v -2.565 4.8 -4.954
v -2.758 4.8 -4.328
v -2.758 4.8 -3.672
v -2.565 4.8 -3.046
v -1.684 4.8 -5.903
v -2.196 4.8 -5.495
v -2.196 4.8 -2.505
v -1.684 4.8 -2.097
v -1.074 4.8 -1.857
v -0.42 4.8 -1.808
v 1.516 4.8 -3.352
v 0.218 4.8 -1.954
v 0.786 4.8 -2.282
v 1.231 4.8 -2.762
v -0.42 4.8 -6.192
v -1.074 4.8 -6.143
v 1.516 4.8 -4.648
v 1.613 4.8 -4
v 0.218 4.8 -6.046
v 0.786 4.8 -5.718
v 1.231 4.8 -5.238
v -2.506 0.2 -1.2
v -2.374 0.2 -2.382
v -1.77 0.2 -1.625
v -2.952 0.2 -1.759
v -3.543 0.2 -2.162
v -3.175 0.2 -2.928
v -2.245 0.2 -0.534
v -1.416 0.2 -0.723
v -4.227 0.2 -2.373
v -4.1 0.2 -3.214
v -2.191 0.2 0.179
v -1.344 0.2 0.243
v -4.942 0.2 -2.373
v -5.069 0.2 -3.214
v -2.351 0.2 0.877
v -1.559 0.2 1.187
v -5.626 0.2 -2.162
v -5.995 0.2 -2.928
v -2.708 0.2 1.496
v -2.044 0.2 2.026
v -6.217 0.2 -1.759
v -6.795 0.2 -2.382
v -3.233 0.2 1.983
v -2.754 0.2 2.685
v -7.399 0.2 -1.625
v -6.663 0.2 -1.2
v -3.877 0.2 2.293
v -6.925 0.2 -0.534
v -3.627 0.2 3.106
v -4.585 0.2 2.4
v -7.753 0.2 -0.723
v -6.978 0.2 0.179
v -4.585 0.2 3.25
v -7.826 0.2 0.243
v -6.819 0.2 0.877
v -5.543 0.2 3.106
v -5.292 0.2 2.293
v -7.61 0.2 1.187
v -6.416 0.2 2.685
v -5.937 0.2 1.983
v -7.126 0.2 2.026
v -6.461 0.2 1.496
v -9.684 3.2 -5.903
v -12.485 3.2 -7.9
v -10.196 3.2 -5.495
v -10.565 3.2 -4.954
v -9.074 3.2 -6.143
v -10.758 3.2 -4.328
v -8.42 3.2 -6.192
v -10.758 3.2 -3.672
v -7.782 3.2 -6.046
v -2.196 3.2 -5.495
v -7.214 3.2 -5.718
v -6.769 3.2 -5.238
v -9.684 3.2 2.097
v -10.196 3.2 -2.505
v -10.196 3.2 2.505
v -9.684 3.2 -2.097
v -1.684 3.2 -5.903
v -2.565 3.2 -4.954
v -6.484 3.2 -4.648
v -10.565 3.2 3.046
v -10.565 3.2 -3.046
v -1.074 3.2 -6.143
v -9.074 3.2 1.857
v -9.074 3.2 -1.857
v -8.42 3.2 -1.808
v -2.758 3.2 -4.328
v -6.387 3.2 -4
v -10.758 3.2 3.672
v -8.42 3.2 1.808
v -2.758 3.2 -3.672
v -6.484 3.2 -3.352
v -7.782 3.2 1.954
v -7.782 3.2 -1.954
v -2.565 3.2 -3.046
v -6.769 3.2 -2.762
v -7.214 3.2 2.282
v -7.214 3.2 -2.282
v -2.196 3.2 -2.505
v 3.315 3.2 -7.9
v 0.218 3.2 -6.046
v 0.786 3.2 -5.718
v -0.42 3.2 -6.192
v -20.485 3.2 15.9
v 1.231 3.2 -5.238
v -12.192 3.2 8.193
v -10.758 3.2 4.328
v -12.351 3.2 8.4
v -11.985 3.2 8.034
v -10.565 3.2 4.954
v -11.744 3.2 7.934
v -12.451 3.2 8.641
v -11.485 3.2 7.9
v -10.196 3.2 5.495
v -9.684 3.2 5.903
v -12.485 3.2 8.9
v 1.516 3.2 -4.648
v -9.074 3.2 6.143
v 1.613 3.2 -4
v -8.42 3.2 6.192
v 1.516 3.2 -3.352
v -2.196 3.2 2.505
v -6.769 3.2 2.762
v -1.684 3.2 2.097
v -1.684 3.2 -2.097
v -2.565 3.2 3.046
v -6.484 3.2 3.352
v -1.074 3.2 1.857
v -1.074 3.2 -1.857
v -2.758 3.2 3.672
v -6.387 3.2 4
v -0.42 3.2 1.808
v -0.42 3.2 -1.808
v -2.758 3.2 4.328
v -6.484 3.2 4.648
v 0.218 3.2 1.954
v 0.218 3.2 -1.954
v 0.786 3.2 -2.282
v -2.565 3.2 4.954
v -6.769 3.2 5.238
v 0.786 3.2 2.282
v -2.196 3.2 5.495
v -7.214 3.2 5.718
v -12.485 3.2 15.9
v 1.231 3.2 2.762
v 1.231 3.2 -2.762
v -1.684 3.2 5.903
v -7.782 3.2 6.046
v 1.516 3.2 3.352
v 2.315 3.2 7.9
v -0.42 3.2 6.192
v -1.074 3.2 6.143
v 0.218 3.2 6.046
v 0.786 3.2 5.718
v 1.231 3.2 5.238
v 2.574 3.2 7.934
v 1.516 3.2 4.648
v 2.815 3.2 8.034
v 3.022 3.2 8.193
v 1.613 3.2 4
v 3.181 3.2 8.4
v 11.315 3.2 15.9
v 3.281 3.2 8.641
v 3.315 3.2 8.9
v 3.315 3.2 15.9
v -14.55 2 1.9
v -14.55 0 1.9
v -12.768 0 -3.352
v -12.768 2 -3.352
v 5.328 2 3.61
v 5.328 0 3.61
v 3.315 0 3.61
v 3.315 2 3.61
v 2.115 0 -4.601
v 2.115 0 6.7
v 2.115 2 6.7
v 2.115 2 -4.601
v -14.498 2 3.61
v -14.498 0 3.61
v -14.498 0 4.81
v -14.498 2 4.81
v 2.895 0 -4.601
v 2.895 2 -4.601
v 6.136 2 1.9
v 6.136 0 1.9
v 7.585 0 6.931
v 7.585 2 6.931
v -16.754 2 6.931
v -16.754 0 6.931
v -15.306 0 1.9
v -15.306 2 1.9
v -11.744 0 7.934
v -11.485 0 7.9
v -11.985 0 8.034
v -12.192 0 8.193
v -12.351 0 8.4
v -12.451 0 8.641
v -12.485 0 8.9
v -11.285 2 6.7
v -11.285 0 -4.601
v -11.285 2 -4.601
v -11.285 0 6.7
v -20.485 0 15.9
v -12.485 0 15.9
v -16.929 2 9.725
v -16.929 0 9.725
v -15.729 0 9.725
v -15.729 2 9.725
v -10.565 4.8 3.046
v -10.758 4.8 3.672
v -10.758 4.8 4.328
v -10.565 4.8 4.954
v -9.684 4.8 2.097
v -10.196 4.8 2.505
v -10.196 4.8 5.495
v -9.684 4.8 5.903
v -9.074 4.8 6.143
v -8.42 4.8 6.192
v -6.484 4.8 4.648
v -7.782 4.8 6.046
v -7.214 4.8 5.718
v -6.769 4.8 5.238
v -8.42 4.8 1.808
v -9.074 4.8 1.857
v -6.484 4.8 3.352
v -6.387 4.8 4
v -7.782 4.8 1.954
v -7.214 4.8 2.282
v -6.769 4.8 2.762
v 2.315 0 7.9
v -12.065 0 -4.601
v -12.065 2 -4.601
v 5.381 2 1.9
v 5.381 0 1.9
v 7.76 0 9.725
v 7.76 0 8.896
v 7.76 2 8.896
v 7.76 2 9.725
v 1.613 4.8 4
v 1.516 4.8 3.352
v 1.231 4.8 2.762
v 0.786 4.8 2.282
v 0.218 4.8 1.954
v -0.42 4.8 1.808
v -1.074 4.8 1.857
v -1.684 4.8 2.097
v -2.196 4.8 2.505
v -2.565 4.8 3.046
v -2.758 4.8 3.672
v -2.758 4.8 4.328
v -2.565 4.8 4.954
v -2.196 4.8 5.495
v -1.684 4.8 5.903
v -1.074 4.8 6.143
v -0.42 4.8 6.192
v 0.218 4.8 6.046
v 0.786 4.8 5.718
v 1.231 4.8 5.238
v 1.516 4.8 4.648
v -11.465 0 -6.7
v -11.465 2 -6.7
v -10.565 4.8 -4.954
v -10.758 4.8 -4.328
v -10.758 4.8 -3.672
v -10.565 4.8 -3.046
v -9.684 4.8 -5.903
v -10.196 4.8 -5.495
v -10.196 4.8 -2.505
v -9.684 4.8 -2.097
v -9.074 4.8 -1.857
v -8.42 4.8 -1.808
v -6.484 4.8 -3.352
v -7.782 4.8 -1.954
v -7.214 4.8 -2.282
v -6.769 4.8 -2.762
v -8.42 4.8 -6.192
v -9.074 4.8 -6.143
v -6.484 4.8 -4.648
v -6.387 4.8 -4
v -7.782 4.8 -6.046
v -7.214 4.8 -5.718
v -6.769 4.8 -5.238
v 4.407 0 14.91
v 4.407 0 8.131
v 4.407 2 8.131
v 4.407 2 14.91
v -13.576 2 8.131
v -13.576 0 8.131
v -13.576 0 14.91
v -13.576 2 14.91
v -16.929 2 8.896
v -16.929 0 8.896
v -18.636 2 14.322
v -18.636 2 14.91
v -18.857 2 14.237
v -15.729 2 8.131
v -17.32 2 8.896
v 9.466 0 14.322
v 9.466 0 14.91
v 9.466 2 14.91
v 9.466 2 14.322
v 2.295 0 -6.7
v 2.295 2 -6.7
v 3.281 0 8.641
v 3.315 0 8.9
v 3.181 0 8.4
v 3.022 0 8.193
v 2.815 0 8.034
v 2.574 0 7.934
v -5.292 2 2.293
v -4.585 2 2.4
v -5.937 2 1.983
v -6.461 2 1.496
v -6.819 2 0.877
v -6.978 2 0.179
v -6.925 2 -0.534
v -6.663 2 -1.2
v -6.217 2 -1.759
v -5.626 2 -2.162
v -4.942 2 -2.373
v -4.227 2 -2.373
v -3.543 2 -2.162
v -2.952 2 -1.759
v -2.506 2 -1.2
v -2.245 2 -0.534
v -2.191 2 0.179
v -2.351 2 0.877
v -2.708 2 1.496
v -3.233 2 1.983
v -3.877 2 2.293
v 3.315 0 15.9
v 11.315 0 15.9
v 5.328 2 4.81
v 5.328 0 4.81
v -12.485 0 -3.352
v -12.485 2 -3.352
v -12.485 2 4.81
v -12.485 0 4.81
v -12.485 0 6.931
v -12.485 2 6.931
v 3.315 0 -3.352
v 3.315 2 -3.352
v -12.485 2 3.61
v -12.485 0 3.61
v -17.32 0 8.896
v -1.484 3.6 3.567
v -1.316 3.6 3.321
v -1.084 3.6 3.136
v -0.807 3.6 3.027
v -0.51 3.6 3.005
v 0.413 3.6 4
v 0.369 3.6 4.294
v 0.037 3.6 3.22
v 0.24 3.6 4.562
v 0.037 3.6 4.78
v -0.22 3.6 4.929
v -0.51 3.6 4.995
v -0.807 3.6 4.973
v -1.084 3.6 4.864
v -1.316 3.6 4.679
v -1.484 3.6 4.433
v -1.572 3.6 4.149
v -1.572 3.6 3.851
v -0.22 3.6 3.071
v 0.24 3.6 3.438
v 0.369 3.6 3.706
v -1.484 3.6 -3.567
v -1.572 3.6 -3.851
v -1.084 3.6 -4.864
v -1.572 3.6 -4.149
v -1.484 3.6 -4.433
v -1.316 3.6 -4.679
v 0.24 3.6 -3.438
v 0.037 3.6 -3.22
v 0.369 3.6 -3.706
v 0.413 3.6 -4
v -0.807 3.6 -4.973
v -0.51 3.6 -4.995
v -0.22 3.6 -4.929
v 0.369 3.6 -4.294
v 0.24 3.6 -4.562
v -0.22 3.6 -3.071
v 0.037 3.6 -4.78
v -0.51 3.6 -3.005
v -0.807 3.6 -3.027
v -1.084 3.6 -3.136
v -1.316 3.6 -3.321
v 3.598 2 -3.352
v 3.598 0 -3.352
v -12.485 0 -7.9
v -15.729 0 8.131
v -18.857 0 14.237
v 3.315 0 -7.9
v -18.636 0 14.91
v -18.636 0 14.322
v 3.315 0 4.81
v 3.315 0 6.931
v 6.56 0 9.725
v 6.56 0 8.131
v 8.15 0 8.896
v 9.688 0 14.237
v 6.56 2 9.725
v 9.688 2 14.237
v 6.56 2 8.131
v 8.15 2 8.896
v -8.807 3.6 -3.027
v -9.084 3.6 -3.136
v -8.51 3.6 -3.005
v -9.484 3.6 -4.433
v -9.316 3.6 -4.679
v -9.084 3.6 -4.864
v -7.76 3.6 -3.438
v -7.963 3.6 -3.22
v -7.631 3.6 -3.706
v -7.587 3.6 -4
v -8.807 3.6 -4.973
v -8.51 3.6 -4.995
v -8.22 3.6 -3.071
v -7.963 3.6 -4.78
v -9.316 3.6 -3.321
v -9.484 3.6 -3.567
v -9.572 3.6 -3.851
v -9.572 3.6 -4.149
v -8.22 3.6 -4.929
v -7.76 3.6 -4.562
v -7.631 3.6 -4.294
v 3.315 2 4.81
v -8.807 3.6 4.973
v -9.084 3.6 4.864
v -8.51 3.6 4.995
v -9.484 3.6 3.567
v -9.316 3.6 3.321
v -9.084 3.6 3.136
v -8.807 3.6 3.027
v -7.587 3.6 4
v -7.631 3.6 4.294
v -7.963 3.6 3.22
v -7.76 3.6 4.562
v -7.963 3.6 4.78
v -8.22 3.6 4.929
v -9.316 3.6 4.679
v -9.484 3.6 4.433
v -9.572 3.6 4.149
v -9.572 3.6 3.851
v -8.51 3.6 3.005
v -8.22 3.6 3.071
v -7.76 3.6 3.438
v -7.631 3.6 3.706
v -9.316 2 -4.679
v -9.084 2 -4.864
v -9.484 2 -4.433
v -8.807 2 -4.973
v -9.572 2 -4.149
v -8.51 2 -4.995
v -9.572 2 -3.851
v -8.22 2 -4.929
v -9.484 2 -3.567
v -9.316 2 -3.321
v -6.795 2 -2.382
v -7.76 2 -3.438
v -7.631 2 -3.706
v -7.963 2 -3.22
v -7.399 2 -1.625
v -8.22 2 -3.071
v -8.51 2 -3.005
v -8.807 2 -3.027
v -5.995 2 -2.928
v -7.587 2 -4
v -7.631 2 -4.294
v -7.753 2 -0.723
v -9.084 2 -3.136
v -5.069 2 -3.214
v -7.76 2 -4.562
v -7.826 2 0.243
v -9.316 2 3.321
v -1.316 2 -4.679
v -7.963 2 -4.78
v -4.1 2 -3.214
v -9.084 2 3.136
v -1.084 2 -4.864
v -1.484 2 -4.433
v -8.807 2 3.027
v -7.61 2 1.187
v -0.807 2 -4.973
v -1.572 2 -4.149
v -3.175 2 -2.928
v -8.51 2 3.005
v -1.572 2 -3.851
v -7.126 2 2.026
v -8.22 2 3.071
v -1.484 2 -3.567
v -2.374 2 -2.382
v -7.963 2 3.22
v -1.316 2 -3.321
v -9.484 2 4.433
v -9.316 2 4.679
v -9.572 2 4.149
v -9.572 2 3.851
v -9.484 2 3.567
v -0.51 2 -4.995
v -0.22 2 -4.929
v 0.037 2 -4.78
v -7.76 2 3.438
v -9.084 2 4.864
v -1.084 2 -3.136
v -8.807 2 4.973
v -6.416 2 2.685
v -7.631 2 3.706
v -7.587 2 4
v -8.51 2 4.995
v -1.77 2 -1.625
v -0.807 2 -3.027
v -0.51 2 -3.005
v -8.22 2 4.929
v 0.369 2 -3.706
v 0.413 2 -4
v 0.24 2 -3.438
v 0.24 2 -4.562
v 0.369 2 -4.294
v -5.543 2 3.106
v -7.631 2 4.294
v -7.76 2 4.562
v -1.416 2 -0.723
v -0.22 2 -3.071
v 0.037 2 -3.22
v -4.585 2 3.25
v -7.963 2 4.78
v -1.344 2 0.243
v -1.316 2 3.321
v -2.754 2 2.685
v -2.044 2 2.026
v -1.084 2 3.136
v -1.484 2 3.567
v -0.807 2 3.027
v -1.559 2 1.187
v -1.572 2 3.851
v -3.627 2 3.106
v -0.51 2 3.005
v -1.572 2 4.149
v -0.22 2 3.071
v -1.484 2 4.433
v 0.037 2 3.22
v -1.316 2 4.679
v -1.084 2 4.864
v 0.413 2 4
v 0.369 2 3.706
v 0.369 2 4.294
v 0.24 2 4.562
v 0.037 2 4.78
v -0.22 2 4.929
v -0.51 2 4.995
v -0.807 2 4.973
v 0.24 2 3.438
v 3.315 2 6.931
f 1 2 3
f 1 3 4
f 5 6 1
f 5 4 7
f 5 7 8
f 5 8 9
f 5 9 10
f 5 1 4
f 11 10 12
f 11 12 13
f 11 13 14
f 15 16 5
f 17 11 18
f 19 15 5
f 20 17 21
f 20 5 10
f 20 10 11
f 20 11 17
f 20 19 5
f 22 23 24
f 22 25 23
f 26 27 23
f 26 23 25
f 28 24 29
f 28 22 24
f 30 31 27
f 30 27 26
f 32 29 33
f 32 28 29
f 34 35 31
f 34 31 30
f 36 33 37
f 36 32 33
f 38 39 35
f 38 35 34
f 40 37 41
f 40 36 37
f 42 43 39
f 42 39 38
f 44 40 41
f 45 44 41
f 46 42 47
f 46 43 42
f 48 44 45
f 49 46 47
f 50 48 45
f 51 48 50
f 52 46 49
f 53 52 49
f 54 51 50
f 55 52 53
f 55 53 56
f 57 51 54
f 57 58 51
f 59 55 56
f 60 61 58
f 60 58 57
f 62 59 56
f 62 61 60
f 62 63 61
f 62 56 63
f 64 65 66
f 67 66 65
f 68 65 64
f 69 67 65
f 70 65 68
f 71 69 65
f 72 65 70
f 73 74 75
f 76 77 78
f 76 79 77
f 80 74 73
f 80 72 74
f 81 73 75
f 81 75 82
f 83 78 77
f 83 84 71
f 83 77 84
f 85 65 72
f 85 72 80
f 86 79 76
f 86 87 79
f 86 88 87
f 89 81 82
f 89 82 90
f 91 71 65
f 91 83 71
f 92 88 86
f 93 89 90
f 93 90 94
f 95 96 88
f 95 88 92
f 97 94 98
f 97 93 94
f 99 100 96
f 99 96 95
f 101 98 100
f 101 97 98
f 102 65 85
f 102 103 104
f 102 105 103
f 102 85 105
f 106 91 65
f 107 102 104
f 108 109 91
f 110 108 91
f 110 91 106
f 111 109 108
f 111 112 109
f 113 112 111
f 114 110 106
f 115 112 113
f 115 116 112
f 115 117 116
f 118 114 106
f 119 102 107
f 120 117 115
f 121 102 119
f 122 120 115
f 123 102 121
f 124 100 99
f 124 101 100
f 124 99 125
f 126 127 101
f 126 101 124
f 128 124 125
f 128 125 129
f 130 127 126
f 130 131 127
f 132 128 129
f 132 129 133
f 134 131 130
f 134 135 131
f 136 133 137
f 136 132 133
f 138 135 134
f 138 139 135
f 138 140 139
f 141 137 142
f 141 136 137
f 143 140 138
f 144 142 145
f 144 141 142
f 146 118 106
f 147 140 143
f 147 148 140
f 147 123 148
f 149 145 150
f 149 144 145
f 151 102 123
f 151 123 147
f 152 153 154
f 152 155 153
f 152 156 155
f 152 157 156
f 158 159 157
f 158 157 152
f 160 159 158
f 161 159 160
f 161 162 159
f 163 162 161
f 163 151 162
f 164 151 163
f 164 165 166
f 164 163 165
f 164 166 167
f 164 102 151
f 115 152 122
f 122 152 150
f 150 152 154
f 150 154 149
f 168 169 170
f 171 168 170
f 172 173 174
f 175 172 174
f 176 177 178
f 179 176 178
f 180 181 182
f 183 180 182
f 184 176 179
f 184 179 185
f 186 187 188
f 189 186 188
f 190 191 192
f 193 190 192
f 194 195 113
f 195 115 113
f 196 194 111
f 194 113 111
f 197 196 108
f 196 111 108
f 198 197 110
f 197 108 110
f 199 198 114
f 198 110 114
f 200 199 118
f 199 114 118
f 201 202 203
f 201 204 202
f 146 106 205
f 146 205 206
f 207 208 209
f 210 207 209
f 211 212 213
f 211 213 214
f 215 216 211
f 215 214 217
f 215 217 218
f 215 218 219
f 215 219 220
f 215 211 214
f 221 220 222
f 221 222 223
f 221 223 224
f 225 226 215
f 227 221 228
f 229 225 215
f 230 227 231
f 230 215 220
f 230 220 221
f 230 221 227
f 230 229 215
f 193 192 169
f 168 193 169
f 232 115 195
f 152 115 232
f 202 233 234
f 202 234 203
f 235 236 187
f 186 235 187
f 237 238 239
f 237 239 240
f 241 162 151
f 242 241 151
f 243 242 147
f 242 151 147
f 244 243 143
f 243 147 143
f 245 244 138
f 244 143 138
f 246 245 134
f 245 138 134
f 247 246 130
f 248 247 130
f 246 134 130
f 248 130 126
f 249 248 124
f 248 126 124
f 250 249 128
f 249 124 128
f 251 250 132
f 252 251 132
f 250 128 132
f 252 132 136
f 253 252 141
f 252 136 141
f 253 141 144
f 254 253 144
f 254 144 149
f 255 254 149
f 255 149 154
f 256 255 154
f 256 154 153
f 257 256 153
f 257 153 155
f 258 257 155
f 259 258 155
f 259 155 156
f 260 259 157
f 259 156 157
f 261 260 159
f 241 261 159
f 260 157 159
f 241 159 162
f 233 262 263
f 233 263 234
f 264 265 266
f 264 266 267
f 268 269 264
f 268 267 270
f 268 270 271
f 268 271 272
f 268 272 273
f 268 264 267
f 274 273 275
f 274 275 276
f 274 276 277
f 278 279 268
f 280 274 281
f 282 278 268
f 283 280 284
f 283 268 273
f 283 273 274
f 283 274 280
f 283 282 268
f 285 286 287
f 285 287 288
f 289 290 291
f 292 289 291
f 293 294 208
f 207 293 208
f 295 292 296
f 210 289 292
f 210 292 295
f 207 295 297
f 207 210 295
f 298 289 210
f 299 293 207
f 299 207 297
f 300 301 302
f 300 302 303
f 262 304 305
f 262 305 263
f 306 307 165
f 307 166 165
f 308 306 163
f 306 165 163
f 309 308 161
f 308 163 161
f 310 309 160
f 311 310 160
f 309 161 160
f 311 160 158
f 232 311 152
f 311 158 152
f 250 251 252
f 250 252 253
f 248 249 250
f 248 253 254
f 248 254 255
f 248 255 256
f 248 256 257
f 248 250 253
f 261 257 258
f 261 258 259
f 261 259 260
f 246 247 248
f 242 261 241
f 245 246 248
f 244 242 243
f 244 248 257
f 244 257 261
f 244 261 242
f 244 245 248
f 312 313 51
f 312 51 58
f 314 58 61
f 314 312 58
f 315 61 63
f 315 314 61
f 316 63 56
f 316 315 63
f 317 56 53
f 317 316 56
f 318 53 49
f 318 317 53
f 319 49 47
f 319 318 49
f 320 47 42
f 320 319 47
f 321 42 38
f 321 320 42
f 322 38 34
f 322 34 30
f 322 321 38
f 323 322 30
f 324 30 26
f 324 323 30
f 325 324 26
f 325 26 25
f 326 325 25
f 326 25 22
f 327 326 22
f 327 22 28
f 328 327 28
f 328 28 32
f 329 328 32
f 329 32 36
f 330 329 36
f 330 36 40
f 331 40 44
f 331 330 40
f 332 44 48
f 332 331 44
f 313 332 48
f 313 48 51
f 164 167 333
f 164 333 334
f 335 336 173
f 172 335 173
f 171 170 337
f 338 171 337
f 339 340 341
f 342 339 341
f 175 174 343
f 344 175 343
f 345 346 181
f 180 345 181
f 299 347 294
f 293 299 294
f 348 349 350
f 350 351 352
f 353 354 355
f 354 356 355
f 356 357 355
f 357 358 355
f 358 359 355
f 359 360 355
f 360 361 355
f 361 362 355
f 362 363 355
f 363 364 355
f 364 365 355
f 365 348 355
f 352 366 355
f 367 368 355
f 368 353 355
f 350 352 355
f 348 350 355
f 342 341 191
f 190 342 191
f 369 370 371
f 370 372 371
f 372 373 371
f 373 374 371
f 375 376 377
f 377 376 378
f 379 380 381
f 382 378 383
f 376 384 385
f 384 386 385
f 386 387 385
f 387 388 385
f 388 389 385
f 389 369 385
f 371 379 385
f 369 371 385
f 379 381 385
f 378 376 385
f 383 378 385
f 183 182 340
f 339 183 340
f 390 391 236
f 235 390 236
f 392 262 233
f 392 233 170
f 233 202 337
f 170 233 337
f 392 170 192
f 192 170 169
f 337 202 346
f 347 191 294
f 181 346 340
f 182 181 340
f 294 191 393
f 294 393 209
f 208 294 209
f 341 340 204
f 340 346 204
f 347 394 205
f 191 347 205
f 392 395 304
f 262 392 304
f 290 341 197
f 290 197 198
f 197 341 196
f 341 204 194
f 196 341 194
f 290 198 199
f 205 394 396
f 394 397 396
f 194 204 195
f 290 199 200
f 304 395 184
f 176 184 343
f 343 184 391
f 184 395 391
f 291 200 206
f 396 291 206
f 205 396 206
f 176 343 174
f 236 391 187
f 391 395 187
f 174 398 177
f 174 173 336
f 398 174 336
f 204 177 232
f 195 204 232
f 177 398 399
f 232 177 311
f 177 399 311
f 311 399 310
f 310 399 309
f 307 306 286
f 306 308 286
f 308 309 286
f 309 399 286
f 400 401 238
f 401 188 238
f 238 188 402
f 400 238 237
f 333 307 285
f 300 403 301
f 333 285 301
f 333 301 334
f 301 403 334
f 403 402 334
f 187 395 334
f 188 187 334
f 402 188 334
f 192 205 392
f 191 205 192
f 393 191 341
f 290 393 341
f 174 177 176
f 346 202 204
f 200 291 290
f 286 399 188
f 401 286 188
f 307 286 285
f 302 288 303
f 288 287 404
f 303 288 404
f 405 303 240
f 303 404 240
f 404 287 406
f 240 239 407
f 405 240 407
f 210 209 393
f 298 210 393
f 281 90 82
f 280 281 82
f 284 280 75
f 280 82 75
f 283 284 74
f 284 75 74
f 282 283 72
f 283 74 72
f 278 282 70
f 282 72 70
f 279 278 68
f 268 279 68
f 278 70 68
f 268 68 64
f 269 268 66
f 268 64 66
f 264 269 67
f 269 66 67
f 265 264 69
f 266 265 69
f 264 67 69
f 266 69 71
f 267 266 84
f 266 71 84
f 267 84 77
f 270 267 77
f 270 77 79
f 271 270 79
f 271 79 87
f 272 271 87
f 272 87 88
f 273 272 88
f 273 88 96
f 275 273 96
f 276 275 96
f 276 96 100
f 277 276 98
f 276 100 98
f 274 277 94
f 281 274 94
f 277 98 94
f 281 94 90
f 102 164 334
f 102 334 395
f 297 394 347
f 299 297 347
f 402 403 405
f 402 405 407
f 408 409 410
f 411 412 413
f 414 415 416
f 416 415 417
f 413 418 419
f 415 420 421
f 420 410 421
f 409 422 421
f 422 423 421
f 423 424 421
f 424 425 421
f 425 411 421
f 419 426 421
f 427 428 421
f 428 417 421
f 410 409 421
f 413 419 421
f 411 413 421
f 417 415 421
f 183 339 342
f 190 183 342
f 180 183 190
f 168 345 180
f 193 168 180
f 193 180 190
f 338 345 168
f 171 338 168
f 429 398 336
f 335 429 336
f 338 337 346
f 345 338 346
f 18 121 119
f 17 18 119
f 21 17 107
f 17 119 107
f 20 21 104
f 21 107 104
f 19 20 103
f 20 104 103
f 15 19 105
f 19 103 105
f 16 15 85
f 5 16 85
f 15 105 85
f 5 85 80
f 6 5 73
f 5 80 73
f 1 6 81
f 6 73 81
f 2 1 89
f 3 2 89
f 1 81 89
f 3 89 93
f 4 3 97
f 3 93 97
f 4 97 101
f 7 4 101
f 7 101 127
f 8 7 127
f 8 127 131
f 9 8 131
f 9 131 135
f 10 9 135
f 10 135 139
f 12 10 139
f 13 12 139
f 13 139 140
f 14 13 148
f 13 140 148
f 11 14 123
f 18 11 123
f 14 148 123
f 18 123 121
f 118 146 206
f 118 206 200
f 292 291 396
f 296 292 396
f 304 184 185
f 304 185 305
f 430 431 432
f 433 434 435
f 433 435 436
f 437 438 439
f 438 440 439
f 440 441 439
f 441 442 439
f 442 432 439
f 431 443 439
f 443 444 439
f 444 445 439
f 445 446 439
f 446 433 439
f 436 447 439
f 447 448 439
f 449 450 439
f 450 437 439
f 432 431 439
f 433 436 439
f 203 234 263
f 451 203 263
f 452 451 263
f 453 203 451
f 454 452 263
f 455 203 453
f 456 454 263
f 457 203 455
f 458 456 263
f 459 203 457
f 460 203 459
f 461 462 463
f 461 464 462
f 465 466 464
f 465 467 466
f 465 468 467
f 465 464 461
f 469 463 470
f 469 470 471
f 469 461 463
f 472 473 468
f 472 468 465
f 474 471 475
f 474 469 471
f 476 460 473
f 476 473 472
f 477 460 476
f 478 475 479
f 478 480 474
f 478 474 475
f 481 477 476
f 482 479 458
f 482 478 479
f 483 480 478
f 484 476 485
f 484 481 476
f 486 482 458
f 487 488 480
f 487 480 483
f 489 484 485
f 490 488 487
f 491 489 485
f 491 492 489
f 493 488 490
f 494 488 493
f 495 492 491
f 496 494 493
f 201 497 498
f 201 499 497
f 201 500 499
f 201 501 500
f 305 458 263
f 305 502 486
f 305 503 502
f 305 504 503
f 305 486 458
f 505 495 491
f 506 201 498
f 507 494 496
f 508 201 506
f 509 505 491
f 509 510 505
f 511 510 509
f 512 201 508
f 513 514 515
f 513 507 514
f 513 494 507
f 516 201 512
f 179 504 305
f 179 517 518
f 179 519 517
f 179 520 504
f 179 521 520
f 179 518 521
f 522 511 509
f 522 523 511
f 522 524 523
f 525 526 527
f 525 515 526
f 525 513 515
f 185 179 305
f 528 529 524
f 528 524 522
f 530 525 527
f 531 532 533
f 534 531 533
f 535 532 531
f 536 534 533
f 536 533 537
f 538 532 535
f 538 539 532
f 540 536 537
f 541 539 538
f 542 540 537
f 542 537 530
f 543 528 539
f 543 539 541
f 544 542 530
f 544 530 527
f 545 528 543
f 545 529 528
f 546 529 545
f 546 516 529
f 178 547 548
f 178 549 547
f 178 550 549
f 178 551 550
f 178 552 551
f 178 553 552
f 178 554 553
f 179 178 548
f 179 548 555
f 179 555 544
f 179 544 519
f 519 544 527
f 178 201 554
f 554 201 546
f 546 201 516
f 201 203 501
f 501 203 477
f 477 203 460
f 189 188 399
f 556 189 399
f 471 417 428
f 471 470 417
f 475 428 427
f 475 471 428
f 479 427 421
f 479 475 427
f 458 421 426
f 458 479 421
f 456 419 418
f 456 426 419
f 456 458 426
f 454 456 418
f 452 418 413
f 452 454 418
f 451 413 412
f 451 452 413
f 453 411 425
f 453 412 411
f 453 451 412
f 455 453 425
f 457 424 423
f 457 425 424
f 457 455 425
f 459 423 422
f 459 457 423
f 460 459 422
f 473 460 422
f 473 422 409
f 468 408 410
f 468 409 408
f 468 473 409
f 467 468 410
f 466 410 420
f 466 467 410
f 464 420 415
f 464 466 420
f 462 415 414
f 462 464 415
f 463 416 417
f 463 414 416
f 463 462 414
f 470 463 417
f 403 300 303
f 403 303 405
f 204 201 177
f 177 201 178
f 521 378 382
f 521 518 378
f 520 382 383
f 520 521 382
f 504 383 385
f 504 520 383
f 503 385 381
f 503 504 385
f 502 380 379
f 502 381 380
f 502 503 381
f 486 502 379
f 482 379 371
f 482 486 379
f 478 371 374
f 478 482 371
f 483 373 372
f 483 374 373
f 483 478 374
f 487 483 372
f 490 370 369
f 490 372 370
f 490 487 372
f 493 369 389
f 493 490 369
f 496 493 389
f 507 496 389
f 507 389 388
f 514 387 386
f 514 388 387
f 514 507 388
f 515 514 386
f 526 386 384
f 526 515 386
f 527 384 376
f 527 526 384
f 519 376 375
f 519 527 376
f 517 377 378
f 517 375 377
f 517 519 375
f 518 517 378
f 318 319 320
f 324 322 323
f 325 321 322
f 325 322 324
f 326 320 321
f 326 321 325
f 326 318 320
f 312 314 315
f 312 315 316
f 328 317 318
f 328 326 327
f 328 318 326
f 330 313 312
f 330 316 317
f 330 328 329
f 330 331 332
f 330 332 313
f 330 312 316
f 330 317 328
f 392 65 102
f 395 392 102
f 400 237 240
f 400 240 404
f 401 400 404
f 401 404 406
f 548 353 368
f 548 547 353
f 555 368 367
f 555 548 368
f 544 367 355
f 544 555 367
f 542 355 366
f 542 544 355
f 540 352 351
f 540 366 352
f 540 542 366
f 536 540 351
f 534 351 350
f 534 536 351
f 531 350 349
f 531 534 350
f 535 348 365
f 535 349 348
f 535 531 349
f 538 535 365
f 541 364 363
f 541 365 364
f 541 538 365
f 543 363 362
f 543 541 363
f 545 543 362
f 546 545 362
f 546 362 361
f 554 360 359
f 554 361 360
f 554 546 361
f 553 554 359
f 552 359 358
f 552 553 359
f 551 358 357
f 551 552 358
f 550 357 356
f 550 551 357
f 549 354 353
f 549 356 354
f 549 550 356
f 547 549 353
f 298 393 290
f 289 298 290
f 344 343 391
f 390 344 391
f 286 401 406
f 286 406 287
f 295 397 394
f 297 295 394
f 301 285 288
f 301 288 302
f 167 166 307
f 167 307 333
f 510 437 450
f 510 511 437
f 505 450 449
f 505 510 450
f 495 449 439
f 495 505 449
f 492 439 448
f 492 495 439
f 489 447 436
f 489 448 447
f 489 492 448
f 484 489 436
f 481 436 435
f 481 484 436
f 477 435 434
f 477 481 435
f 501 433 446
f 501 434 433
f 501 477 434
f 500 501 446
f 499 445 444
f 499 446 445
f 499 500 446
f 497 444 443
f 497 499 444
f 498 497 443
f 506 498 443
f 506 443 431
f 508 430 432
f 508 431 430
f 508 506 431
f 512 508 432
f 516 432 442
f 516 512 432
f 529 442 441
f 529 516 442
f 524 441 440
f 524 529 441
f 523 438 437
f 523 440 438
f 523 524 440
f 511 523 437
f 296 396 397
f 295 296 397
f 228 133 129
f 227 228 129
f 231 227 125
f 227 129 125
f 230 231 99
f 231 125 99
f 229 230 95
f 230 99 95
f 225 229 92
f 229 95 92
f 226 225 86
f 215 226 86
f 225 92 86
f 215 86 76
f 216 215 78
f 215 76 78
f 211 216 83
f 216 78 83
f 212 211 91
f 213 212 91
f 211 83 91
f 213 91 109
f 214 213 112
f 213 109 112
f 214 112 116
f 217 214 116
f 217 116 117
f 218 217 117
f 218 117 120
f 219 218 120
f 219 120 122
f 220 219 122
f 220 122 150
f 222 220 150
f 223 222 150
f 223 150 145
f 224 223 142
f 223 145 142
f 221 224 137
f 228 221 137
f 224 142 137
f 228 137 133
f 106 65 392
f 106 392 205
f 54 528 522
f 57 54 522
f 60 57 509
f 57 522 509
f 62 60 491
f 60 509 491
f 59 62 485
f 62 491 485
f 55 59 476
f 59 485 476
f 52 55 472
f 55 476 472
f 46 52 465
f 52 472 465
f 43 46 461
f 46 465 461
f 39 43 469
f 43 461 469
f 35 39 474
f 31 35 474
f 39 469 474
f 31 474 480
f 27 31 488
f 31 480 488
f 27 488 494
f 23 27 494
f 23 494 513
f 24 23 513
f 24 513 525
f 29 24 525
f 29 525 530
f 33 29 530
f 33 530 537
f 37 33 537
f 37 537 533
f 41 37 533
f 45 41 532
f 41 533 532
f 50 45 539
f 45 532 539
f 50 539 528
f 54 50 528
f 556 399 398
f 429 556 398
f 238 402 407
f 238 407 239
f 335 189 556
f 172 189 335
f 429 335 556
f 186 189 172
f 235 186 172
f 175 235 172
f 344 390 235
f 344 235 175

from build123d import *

# Parameters (mm, degrees)
BASEFRAMESKETCH_W           = 15.8
BASEFRAMESKETCH_H           = 3.2
BASEFRAME_DEPTH             = 7.9
STUDSSKETCH_R               = 2.197938665
STUDS_DEPTH                 = 1.6
MAINSTUDSPATTERN_COUNT      = 2
MAINSTUDSPATTERN_PITCH      = 8
MAINSTUDSPATTERN_COUNT_DIR2 = 2
MAINSTUDSPATTERN_PITCH_DIR2 = 8
MAINBASESHELL_T             = -1.2
UNDERCIRCLESKETCH_R         = 3.25
UNDERCIRCLESKETCH_R_2       = 2.4
UNDERCIRCLEEXTRUDE_DEPTH    = 1.8
ASHAPEDEDGECUT_DEPTH        = 2
FILLET13_R                  = 1


with BuildPart() as part:
    # BaseFrameSketch → BaseFrame (new, symmetric)
    with BuildSketch(Plane.XY):
        with Locations((-4.584729064, 1.6)):
            Rectangle(BASEFRAMESKETCH_W, BASEFRAMESKETCH_H)
    extrude(amount=BASEFRAME_DEPTH, both=True)

    # StudsSketch → Studs (add)
    with BuildSketch(Plane(origin=(0, 3.2, 0), x_dir=(1, 0, 0), z_dir=(0, 1, 0))):
        with Locations((-8.584729064, 4)):
            Circle(STUDSSKETCH_R)
    studs = extrude(amount=STUDS_DEPTH)

    # MainStudsPattern: Studs 2 × 2
    with Locations(*[(i * MAINSTUDSPATTERN_PITCH, 0, j * MAINSTUDSPATTERN_PITCH_DIR2) for i in range(MAINSTUDSPATTERN_COUNT) for j in range(MAINSTUDSPATTERN_COUNT_DIR2) if (i, j) != (0, 0)]):
        add(studs)

    # MainBaseShell
    mainbaseshell_openings = [part.faces().sort_by_distance(p)[0] for p in [
        (-4.584729064, 0, 0),
    ]]
    offset(amount=MAINBASESHELL_T, openings=mainbaseshell_openings, kind=Kind.INTERSECTION)

    # UnderCircleSketch → UnderCircleExtrude (add)
    with BuildSketch(Plane(origin=(0, 2, 0), x_dir=(-1, 0, 0), z_dir=(0, -1, 0))):
        with Locations(Location((4.584729064, 0, 0), (0, 0, 270))):
            Circle(UNDERCIRCLESKETCH_R)
        with Locations(Location((4.584729064, 0, 0), (0, 0, 270))):
            Circle(UNDERCIRCLESKETCH_R_2, mode=Mode.SUBTRACT)
    extrude(amount=UNDERCIRCLEEXTRUDE_DEPTH)

    # Sweep1: sweep along a curve in space
    with BuildLine() as sweep1_path:
        Line((3.315270936, 0, 7.9), (3.315270936, 3.2, 7.9))
    # Sketch10 → Sweep1 (sweep)
    with BuildSketch(Plane(origin=(0, 3.2, 0), x_dir=(1, 0, 0), z_dir=(0, 1, 0))):
        Polygon((-12.484729064, 7.9), (-20.484729064, -15.9), (-12.484729064, -15.9), align=None)
        Polygon((3.315270936, 7.9), (3.315270936, -15.9), (11.315270936, -15.9), align=None)
    sweep(path=sweep1_path.line)

    # Sketch11 → AShapedEdgeCut (cut)
    with BuildSketch(Plane(origin=(0, 0, 0), x_dir=(-1, 0, 0), z_dir=(0, -1, 0))):
        Polygon((-3.315270936, 3.352483875), (-3.598074089, 3.352483875), (-5.380624164, -1.900141374), (-6.136343318, -1.900141374), (-7.584500421, -6.930903588), (-3.315270936, -6.930903588), (-3.315270936, -4.81), (-5.328079185, -4.81), (-5.328079185, -3.61), (-3.315270936, -3.61), align=None)
        Polygon((-7.759680606, -8.895572671), (-7.759680606, -9.725211817), (-6.559680606, -9.725211817), (-6.559680606, -8.130903588), (-4.406736771, -8.130903588), (-4.406736771, -14.91), (-9.466166686, -14.91), (-9.466166686, -14.321814496), (-9.687501352, -14.236531964), (-8.150050802, -8.895572671), align=None)
        Polygon((-2.115270936, 4.601321399), (-2.895270936, 4.601321399), (-2.295270936, 6.7), (-2.115270936, 6.7), align=None)
        Polygon((11.284729064, 4.601321399), (11.284729064, 6.7), (11.464729064, 6.7), (12.064729064, 4.601321399), align=None)
        Polygon((13.576194899, -14.91), (18.635624814, -14.91), (18.635624814, -14.321814496), (18.85695948, -14.236531964), (17.31950893, -8.895572671), (16.929138734, -8.895572671), (16.929138734, -9.725211817), (15.729138734, -9.725211817), (15.729138734, -8.130903588), (13.576194899, -8.130903588), align=None)
        Polygon((12.484729064, -4.81), (12.484729064, -6.930903588), (16.753958549, -6.930903588), (15.305801446, -1.900141374), (14.550082292, -1.900141374), (12.767532217, 3.352483875), (12.484729064, 3.352483875), (12.484729064, -3.61), (14.497537313, -3.61), (14.497537313, -4.81), align=None)
    extrude(amount=-ASHAPEDEDGECUT_DEPTH, mode=Mode.SUBTRACT)

    # Fillet13
    fillet13_edges = [part.edges().sort_by_distance(p)[0] for p in [
        (3.315270936, 1.6, 7.9),
        (-12.484729064, 1.6, 7.9),
    ]]
    fillet(fillet13_edges, radius=FILLET13_R)


solid = part.part
